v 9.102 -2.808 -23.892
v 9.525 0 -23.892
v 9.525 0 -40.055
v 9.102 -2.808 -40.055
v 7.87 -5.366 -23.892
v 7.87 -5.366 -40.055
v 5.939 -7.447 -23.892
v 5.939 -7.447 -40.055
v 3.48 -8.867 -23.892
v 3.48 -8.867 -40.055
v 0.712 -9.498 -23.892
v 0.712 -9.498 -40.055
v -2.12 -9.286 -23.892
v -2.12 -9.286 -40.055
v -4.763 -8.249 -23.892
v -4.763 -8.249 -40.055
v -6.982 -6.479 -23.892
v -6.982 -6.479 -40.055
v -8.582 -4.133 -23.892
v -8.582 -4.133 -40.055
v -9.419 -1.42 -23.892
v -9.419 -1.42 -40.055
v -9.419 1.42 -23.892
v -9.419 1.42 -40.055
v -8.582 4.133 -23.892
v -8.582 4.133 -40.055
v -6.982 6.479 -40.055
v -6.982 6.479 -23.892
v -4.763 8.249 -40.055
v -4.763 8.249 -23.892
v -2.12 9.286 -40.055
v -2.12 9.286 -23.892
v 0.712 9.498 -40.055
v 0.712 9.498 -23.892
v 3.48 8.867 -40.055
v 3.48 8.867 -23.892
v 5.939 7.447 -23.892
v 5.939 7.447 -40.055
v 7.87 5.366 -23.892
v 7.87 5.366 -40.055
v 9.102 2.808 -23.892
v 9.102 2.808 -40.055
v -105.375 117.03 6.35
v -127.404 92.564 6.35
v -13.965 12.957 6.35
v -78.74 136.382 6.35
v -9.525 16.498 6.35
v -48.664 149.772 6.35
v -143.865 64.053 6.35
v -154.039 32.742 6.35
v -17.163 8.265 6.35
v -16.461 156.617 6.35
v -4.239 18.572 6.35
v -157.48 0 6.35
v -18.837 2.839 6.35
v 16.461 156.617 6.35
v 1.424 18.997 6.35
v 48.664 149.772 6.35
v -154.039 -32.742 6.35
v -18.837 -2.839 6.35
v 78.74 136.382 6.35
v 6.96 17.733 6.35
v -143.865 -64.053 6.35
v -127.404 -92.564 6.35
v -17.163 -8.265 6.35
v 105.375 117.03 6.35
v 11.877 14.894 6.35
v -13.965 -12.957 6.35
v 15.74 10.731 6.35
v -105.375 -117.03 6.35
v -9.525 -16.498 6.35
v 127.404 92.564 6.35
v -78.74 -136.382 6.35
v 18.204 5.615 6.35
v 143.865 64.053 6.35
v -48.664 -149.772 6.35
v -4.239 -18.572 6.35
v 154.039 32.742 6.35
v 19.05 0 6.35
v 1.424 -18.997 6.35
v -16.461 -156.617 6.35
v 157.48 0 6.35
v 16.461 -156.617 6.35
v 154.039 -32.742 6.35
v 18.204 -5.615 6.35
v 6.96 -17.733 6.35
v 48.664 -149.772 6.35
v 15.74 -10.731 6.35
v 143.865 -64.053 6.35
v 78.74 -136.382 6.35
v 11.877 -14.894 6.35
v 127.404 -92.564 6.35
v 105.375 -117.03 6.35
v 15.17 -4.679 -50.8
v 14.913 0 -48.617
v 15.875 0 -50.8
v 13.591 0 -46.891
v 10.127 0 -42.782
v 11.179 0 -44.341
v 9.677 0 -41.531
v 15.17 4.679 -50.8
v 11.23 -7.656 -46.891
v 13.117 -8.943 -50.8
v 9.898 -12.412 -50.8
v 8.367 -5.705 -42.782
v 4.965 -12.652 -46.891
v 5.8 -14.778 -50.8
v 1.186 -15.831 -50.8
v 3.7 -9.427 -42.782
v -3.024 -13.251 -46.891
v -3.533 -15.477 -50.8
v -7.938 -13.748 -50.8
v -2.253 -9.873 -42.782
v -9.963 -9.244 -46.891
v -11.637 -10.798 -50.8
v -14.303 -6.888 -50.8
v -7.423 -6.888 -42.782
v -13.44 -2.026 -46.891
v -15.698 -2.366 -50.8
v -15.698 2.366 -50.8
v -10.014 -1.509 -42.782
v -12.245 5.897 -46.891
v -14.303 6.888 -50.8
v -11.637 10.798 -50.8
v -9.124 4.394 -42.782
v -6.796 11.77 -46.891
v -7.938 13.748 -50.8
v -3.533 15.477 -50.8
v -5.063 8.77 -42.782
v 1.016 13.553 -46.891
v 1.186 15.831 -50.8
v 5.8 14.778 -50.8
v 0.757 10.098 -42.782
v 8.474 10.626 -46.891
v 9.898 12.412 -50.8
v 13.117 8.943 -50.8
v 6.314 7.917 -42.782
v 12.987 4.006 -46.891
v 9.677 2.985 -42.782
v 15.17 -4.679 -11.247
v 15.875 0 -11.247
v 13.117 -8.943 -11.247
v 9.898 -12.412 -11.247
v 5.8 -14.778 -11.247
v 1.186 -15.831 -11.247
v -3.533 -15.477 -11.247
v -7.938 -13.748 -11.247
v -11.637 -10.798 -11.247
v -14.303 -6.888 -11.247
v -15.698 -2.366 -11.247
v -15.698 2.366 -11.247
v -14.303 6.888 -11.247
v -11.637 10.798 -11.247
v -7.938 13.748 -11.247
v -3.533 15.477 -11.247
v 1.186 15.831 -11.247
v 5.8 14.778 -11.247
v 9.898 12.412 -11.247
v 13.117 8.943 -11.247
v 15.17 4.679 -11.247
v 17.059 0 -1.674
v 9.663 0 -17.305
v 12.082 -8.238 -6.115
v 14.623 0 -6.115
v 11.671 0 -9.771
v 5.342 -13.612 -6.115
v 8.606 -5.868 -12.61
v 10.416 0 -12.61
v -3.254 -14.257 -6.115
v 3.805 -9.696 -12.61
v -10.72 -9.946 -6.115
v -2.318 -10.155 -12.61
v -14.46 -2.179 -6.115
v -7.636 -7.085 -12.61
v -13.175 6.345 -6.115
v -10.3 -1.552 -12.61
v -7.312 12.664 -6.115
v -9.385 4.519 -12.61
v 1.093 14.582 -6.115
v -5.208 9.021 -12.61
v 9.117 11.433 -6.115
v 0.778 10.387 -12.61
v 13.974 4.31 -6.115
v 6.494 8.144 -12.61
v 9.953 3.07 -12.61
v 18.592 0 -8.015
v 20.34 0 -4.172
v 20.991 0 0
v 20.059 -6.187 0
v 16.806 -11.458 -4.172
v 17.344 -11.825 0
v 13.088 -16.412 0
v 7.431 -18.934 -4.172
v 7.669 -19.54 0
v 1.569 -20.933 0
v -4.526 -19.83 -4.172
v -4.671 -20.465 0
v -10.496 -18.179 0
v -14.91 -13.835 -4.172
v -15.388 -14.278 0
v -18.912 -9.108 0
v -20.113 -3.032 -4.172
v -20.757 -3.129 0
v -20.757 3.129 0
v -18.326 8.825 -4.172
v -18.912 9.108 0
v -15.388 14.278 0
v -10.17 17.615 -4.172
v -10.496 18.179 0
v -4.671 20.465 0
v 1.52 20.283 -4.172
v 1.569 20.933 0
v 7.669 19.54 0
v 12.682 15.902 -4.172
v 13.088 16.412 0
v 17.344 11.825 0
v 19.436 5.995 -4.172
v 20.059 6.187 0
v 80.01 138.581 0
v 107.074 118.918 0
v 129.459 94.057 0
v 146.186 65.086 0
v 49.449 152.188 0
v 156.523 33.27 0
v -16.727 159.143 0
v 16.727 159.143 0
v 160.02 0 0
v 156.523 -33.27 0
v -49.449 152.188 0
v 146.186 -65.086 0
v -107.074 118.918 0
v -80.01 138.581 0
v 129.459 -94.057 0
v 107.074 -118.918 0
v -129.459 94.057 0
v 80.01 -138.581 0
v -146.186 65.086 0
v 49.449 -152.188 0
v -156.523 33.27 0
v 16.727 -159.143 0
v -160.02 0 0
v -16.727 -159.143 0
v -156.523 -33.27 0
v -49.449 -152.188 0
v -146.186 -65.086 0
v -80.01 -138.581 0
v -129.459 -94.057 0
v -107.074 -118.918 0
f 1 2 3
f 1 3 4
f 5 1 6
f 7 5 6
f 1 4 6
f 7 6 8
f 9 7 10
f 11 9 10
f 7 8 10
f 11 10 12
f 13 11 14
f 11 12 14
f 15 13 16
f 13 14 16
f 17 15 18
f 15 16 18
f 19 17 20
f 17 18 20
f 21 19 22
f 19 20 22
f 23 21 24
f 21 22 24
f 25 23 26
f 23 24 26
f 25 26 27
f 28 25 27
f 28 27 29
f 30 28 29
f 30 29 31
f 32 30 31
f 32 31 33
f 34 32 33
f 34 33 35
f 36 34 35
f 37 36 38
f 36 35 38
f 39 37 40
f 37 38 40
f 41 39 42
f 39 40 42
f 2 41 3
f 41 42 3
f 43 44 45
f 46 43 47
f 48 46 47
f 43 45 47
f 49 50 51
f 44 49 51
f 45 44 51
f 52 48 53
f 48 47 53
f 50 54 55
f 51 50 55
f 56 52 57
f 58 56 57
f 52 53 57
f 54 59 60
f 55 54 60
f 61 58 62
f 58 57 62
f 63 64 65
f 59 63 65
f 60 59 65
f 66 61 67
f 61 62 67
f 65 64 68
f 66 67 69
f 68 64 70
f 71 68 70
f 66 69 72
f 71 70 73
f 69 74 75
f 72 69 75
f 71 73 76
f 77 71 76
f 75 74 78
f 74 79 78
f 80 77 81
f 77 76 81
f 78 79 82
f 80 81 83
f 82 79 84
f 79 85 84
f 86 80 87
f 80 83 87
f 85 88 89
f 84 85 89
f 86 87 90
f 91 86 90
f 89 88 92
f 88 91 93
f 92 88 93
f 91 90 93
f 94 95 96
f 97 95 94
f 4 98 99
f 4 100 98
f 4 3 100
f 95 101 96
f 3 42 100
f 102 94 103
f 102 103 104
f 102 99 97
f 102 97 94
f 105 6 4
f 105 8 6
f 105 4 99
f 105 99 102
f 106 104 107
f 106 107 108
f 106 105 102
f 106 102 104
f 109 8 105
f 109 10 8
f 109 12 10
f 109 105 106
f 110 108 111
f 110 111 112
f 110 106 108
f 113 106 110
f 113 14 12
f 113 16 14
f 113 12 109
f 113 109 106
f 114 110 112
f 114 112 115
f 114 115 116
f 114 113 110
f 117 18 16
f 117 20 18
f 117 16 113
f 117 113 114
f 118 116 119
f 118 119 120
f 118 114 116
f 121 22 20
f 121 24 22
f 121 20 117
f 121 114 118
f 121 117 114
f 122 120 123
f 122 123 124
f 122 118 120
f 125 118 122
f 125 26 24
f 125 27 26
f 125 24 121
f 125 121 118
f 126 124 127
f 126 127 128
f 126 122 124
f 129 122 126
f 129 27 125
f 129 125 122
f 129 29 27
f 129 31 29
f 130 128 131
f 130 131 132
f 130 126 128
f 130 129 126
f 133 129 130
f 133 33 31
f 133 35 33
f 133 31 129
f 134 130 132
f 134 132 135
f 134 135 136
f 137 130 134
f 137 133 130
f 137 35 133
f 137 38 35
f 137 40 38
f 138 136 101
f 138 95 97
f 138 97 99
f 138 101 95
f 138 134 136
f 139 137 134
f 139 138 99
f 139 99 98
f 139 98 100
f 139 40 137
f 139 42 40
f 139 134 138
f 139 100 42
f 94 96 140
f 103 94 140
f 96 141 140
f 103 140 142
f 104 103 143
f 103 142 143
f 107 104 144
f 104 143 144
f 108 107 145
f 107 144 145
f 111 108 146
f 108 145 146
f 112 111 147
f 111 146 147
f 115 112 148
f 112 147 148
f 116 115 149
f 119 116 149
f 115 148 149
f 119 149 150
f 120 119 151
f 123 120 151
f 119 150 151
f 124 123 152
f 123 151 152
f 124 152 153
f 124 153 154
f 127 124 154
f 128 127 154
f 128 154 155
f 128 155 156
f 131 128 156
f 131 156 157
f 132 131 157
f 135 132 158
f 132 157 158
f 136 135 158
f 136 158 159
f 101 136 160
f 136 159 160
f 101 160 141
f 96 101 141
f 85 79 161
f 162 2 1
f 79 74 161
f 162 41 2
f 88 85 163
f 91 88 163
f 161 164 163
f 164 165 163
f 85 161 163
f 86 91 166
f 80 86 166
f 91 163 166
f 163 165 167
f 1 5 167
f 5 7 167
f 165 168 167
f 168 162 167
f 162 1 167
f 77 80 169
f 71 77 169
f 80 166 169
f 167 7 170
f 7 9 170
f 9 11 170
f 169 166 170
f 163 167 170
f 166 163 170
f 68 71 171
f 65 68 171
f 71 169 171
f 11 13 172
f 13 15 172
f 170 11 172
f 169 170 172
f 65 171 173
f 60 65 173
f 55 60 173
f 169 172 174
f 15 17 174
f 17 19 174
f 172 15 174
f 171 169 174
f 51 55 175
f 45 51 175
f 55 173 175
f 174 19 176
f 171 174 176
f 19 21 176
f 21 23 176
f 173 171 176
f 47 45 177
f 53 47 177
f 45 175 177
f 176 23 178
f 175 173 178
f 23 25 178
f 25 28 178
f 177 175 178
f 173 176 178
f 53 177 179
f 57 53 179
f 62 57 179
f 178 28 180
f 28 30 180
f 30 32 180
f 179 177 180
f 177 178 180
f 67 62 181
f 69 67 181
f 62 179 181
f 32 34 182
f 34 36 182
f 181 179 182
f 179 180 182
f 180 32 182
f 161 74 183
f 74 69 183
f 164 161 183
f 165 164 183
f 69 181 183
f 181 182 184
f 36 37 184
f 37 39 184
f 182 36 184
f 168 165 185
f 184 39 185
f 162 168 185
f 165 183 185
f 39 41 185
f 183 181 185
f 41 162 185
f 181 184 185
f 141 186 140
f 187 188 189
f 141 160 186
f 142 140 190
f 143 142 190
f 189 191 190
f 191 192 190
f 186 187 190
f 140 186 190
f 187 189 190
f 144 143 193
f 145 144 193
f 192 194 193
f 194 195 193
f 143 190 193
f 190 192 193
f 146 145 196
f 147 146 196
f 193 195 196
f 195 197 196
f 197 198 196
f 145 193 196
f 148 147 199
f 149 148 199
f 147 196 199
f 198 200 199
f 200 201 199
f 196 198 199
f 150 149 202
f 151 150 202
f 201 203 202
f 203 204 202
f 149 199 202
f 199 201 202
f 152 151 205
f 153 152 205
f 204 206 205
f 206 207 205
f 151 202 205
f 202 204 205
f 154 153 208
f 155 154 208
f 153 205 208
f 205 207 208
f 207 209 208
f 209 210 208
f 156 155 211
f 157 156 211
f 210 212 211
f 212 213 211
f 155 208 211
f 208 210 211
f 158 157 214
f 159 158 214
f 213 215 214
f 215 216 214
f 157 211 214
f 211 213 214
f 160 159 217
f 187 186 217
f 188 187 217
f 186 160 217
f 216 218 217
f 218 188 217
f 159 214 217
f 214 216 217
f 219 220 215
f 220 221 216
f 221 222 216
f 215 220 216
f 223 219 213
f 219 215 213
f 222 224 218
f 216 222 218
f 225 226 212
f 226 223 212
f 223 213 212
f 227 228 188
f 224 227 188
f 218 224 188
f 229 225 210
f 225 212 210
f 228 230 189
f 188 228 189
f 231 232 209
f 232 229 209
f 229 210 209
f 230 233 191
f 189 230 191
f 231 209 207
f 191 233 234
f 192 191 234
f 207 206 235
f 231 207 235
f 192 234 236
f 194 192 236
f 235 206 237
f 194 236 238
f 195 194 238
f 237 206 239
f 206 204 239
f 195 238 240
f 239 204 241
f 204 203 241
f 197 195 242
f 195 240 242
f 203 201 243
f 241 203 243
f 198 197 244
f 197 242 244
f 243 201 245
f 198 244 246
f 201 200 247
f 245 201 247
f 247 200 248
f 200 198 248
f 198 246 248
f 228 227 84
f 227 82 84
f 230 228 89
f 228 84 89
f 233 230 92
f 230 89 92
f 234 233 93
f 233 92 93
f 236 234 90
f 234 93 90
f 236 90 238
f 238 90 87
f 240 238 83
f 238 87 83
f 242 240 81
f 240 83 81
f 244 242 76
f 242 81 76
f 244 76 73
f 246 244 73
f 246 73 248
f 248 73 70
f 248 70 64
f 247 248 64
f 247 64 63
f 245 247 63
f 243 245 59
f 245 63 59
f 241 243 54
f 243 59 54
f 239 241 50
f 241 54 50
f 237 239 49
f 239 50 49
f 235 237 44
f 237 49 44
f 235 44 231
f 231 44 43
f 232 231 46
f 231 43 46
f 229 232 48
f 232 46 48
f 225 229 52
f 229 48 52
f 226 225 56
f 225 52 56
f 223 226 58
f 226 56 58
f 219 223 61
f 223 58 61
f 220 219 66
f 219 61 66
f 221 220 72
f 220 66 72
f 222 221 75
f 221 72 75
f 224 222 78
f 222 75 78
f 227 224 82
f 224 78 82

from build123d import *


with BuildPart() as f1:
    # F0 (on Front) → F1 (revolve)
    with BuildSketch(Plane.XZ):
        with BuildLine():
            ThreePointArc((15.875, -11.2468861043), (19.5966413277, -6.152735897), (20.9912098944, 0))
            Line((20.9912098944, 0), (160.02, 0))
            Line((160.02, 0), (157.48, 6.35))
            Line((157.48, 6.35), (19.05, 6.35))
            add(Edge.make_bspline(
                [(19.05, 6.35), (17.2943395607, -5.2739201542), (10.3896663187, -7.9876436539), (9.4300154597, -16.612906009), (9.525, -23.8922853023)],
                knots=[0, 0, 0, 0, 0.5270987441, 1, 1, 1, 1], degree=3))
            Line((9.525, -23.8922853023), (9.525, -40.0551594794))
            add(Edge.make_bspline(
                [(15.875, -50.8), (14.4695304334, -45.8264946938), (9.4677070156, -44.9470542371), (9.525, -40.0551594794)],
                knots=[0, 0, 0, 0, 12.4809493955, 12.4809493955, 12.4809493955, 12.4809493955], degree=3))
            Line((15.875, -50.8), (15.875, -11.2468861043))
        make_face()
    revolve(axis=Axis((0, 0, 2.4035767974), (0, 0, -1)))


solid = f1.part
